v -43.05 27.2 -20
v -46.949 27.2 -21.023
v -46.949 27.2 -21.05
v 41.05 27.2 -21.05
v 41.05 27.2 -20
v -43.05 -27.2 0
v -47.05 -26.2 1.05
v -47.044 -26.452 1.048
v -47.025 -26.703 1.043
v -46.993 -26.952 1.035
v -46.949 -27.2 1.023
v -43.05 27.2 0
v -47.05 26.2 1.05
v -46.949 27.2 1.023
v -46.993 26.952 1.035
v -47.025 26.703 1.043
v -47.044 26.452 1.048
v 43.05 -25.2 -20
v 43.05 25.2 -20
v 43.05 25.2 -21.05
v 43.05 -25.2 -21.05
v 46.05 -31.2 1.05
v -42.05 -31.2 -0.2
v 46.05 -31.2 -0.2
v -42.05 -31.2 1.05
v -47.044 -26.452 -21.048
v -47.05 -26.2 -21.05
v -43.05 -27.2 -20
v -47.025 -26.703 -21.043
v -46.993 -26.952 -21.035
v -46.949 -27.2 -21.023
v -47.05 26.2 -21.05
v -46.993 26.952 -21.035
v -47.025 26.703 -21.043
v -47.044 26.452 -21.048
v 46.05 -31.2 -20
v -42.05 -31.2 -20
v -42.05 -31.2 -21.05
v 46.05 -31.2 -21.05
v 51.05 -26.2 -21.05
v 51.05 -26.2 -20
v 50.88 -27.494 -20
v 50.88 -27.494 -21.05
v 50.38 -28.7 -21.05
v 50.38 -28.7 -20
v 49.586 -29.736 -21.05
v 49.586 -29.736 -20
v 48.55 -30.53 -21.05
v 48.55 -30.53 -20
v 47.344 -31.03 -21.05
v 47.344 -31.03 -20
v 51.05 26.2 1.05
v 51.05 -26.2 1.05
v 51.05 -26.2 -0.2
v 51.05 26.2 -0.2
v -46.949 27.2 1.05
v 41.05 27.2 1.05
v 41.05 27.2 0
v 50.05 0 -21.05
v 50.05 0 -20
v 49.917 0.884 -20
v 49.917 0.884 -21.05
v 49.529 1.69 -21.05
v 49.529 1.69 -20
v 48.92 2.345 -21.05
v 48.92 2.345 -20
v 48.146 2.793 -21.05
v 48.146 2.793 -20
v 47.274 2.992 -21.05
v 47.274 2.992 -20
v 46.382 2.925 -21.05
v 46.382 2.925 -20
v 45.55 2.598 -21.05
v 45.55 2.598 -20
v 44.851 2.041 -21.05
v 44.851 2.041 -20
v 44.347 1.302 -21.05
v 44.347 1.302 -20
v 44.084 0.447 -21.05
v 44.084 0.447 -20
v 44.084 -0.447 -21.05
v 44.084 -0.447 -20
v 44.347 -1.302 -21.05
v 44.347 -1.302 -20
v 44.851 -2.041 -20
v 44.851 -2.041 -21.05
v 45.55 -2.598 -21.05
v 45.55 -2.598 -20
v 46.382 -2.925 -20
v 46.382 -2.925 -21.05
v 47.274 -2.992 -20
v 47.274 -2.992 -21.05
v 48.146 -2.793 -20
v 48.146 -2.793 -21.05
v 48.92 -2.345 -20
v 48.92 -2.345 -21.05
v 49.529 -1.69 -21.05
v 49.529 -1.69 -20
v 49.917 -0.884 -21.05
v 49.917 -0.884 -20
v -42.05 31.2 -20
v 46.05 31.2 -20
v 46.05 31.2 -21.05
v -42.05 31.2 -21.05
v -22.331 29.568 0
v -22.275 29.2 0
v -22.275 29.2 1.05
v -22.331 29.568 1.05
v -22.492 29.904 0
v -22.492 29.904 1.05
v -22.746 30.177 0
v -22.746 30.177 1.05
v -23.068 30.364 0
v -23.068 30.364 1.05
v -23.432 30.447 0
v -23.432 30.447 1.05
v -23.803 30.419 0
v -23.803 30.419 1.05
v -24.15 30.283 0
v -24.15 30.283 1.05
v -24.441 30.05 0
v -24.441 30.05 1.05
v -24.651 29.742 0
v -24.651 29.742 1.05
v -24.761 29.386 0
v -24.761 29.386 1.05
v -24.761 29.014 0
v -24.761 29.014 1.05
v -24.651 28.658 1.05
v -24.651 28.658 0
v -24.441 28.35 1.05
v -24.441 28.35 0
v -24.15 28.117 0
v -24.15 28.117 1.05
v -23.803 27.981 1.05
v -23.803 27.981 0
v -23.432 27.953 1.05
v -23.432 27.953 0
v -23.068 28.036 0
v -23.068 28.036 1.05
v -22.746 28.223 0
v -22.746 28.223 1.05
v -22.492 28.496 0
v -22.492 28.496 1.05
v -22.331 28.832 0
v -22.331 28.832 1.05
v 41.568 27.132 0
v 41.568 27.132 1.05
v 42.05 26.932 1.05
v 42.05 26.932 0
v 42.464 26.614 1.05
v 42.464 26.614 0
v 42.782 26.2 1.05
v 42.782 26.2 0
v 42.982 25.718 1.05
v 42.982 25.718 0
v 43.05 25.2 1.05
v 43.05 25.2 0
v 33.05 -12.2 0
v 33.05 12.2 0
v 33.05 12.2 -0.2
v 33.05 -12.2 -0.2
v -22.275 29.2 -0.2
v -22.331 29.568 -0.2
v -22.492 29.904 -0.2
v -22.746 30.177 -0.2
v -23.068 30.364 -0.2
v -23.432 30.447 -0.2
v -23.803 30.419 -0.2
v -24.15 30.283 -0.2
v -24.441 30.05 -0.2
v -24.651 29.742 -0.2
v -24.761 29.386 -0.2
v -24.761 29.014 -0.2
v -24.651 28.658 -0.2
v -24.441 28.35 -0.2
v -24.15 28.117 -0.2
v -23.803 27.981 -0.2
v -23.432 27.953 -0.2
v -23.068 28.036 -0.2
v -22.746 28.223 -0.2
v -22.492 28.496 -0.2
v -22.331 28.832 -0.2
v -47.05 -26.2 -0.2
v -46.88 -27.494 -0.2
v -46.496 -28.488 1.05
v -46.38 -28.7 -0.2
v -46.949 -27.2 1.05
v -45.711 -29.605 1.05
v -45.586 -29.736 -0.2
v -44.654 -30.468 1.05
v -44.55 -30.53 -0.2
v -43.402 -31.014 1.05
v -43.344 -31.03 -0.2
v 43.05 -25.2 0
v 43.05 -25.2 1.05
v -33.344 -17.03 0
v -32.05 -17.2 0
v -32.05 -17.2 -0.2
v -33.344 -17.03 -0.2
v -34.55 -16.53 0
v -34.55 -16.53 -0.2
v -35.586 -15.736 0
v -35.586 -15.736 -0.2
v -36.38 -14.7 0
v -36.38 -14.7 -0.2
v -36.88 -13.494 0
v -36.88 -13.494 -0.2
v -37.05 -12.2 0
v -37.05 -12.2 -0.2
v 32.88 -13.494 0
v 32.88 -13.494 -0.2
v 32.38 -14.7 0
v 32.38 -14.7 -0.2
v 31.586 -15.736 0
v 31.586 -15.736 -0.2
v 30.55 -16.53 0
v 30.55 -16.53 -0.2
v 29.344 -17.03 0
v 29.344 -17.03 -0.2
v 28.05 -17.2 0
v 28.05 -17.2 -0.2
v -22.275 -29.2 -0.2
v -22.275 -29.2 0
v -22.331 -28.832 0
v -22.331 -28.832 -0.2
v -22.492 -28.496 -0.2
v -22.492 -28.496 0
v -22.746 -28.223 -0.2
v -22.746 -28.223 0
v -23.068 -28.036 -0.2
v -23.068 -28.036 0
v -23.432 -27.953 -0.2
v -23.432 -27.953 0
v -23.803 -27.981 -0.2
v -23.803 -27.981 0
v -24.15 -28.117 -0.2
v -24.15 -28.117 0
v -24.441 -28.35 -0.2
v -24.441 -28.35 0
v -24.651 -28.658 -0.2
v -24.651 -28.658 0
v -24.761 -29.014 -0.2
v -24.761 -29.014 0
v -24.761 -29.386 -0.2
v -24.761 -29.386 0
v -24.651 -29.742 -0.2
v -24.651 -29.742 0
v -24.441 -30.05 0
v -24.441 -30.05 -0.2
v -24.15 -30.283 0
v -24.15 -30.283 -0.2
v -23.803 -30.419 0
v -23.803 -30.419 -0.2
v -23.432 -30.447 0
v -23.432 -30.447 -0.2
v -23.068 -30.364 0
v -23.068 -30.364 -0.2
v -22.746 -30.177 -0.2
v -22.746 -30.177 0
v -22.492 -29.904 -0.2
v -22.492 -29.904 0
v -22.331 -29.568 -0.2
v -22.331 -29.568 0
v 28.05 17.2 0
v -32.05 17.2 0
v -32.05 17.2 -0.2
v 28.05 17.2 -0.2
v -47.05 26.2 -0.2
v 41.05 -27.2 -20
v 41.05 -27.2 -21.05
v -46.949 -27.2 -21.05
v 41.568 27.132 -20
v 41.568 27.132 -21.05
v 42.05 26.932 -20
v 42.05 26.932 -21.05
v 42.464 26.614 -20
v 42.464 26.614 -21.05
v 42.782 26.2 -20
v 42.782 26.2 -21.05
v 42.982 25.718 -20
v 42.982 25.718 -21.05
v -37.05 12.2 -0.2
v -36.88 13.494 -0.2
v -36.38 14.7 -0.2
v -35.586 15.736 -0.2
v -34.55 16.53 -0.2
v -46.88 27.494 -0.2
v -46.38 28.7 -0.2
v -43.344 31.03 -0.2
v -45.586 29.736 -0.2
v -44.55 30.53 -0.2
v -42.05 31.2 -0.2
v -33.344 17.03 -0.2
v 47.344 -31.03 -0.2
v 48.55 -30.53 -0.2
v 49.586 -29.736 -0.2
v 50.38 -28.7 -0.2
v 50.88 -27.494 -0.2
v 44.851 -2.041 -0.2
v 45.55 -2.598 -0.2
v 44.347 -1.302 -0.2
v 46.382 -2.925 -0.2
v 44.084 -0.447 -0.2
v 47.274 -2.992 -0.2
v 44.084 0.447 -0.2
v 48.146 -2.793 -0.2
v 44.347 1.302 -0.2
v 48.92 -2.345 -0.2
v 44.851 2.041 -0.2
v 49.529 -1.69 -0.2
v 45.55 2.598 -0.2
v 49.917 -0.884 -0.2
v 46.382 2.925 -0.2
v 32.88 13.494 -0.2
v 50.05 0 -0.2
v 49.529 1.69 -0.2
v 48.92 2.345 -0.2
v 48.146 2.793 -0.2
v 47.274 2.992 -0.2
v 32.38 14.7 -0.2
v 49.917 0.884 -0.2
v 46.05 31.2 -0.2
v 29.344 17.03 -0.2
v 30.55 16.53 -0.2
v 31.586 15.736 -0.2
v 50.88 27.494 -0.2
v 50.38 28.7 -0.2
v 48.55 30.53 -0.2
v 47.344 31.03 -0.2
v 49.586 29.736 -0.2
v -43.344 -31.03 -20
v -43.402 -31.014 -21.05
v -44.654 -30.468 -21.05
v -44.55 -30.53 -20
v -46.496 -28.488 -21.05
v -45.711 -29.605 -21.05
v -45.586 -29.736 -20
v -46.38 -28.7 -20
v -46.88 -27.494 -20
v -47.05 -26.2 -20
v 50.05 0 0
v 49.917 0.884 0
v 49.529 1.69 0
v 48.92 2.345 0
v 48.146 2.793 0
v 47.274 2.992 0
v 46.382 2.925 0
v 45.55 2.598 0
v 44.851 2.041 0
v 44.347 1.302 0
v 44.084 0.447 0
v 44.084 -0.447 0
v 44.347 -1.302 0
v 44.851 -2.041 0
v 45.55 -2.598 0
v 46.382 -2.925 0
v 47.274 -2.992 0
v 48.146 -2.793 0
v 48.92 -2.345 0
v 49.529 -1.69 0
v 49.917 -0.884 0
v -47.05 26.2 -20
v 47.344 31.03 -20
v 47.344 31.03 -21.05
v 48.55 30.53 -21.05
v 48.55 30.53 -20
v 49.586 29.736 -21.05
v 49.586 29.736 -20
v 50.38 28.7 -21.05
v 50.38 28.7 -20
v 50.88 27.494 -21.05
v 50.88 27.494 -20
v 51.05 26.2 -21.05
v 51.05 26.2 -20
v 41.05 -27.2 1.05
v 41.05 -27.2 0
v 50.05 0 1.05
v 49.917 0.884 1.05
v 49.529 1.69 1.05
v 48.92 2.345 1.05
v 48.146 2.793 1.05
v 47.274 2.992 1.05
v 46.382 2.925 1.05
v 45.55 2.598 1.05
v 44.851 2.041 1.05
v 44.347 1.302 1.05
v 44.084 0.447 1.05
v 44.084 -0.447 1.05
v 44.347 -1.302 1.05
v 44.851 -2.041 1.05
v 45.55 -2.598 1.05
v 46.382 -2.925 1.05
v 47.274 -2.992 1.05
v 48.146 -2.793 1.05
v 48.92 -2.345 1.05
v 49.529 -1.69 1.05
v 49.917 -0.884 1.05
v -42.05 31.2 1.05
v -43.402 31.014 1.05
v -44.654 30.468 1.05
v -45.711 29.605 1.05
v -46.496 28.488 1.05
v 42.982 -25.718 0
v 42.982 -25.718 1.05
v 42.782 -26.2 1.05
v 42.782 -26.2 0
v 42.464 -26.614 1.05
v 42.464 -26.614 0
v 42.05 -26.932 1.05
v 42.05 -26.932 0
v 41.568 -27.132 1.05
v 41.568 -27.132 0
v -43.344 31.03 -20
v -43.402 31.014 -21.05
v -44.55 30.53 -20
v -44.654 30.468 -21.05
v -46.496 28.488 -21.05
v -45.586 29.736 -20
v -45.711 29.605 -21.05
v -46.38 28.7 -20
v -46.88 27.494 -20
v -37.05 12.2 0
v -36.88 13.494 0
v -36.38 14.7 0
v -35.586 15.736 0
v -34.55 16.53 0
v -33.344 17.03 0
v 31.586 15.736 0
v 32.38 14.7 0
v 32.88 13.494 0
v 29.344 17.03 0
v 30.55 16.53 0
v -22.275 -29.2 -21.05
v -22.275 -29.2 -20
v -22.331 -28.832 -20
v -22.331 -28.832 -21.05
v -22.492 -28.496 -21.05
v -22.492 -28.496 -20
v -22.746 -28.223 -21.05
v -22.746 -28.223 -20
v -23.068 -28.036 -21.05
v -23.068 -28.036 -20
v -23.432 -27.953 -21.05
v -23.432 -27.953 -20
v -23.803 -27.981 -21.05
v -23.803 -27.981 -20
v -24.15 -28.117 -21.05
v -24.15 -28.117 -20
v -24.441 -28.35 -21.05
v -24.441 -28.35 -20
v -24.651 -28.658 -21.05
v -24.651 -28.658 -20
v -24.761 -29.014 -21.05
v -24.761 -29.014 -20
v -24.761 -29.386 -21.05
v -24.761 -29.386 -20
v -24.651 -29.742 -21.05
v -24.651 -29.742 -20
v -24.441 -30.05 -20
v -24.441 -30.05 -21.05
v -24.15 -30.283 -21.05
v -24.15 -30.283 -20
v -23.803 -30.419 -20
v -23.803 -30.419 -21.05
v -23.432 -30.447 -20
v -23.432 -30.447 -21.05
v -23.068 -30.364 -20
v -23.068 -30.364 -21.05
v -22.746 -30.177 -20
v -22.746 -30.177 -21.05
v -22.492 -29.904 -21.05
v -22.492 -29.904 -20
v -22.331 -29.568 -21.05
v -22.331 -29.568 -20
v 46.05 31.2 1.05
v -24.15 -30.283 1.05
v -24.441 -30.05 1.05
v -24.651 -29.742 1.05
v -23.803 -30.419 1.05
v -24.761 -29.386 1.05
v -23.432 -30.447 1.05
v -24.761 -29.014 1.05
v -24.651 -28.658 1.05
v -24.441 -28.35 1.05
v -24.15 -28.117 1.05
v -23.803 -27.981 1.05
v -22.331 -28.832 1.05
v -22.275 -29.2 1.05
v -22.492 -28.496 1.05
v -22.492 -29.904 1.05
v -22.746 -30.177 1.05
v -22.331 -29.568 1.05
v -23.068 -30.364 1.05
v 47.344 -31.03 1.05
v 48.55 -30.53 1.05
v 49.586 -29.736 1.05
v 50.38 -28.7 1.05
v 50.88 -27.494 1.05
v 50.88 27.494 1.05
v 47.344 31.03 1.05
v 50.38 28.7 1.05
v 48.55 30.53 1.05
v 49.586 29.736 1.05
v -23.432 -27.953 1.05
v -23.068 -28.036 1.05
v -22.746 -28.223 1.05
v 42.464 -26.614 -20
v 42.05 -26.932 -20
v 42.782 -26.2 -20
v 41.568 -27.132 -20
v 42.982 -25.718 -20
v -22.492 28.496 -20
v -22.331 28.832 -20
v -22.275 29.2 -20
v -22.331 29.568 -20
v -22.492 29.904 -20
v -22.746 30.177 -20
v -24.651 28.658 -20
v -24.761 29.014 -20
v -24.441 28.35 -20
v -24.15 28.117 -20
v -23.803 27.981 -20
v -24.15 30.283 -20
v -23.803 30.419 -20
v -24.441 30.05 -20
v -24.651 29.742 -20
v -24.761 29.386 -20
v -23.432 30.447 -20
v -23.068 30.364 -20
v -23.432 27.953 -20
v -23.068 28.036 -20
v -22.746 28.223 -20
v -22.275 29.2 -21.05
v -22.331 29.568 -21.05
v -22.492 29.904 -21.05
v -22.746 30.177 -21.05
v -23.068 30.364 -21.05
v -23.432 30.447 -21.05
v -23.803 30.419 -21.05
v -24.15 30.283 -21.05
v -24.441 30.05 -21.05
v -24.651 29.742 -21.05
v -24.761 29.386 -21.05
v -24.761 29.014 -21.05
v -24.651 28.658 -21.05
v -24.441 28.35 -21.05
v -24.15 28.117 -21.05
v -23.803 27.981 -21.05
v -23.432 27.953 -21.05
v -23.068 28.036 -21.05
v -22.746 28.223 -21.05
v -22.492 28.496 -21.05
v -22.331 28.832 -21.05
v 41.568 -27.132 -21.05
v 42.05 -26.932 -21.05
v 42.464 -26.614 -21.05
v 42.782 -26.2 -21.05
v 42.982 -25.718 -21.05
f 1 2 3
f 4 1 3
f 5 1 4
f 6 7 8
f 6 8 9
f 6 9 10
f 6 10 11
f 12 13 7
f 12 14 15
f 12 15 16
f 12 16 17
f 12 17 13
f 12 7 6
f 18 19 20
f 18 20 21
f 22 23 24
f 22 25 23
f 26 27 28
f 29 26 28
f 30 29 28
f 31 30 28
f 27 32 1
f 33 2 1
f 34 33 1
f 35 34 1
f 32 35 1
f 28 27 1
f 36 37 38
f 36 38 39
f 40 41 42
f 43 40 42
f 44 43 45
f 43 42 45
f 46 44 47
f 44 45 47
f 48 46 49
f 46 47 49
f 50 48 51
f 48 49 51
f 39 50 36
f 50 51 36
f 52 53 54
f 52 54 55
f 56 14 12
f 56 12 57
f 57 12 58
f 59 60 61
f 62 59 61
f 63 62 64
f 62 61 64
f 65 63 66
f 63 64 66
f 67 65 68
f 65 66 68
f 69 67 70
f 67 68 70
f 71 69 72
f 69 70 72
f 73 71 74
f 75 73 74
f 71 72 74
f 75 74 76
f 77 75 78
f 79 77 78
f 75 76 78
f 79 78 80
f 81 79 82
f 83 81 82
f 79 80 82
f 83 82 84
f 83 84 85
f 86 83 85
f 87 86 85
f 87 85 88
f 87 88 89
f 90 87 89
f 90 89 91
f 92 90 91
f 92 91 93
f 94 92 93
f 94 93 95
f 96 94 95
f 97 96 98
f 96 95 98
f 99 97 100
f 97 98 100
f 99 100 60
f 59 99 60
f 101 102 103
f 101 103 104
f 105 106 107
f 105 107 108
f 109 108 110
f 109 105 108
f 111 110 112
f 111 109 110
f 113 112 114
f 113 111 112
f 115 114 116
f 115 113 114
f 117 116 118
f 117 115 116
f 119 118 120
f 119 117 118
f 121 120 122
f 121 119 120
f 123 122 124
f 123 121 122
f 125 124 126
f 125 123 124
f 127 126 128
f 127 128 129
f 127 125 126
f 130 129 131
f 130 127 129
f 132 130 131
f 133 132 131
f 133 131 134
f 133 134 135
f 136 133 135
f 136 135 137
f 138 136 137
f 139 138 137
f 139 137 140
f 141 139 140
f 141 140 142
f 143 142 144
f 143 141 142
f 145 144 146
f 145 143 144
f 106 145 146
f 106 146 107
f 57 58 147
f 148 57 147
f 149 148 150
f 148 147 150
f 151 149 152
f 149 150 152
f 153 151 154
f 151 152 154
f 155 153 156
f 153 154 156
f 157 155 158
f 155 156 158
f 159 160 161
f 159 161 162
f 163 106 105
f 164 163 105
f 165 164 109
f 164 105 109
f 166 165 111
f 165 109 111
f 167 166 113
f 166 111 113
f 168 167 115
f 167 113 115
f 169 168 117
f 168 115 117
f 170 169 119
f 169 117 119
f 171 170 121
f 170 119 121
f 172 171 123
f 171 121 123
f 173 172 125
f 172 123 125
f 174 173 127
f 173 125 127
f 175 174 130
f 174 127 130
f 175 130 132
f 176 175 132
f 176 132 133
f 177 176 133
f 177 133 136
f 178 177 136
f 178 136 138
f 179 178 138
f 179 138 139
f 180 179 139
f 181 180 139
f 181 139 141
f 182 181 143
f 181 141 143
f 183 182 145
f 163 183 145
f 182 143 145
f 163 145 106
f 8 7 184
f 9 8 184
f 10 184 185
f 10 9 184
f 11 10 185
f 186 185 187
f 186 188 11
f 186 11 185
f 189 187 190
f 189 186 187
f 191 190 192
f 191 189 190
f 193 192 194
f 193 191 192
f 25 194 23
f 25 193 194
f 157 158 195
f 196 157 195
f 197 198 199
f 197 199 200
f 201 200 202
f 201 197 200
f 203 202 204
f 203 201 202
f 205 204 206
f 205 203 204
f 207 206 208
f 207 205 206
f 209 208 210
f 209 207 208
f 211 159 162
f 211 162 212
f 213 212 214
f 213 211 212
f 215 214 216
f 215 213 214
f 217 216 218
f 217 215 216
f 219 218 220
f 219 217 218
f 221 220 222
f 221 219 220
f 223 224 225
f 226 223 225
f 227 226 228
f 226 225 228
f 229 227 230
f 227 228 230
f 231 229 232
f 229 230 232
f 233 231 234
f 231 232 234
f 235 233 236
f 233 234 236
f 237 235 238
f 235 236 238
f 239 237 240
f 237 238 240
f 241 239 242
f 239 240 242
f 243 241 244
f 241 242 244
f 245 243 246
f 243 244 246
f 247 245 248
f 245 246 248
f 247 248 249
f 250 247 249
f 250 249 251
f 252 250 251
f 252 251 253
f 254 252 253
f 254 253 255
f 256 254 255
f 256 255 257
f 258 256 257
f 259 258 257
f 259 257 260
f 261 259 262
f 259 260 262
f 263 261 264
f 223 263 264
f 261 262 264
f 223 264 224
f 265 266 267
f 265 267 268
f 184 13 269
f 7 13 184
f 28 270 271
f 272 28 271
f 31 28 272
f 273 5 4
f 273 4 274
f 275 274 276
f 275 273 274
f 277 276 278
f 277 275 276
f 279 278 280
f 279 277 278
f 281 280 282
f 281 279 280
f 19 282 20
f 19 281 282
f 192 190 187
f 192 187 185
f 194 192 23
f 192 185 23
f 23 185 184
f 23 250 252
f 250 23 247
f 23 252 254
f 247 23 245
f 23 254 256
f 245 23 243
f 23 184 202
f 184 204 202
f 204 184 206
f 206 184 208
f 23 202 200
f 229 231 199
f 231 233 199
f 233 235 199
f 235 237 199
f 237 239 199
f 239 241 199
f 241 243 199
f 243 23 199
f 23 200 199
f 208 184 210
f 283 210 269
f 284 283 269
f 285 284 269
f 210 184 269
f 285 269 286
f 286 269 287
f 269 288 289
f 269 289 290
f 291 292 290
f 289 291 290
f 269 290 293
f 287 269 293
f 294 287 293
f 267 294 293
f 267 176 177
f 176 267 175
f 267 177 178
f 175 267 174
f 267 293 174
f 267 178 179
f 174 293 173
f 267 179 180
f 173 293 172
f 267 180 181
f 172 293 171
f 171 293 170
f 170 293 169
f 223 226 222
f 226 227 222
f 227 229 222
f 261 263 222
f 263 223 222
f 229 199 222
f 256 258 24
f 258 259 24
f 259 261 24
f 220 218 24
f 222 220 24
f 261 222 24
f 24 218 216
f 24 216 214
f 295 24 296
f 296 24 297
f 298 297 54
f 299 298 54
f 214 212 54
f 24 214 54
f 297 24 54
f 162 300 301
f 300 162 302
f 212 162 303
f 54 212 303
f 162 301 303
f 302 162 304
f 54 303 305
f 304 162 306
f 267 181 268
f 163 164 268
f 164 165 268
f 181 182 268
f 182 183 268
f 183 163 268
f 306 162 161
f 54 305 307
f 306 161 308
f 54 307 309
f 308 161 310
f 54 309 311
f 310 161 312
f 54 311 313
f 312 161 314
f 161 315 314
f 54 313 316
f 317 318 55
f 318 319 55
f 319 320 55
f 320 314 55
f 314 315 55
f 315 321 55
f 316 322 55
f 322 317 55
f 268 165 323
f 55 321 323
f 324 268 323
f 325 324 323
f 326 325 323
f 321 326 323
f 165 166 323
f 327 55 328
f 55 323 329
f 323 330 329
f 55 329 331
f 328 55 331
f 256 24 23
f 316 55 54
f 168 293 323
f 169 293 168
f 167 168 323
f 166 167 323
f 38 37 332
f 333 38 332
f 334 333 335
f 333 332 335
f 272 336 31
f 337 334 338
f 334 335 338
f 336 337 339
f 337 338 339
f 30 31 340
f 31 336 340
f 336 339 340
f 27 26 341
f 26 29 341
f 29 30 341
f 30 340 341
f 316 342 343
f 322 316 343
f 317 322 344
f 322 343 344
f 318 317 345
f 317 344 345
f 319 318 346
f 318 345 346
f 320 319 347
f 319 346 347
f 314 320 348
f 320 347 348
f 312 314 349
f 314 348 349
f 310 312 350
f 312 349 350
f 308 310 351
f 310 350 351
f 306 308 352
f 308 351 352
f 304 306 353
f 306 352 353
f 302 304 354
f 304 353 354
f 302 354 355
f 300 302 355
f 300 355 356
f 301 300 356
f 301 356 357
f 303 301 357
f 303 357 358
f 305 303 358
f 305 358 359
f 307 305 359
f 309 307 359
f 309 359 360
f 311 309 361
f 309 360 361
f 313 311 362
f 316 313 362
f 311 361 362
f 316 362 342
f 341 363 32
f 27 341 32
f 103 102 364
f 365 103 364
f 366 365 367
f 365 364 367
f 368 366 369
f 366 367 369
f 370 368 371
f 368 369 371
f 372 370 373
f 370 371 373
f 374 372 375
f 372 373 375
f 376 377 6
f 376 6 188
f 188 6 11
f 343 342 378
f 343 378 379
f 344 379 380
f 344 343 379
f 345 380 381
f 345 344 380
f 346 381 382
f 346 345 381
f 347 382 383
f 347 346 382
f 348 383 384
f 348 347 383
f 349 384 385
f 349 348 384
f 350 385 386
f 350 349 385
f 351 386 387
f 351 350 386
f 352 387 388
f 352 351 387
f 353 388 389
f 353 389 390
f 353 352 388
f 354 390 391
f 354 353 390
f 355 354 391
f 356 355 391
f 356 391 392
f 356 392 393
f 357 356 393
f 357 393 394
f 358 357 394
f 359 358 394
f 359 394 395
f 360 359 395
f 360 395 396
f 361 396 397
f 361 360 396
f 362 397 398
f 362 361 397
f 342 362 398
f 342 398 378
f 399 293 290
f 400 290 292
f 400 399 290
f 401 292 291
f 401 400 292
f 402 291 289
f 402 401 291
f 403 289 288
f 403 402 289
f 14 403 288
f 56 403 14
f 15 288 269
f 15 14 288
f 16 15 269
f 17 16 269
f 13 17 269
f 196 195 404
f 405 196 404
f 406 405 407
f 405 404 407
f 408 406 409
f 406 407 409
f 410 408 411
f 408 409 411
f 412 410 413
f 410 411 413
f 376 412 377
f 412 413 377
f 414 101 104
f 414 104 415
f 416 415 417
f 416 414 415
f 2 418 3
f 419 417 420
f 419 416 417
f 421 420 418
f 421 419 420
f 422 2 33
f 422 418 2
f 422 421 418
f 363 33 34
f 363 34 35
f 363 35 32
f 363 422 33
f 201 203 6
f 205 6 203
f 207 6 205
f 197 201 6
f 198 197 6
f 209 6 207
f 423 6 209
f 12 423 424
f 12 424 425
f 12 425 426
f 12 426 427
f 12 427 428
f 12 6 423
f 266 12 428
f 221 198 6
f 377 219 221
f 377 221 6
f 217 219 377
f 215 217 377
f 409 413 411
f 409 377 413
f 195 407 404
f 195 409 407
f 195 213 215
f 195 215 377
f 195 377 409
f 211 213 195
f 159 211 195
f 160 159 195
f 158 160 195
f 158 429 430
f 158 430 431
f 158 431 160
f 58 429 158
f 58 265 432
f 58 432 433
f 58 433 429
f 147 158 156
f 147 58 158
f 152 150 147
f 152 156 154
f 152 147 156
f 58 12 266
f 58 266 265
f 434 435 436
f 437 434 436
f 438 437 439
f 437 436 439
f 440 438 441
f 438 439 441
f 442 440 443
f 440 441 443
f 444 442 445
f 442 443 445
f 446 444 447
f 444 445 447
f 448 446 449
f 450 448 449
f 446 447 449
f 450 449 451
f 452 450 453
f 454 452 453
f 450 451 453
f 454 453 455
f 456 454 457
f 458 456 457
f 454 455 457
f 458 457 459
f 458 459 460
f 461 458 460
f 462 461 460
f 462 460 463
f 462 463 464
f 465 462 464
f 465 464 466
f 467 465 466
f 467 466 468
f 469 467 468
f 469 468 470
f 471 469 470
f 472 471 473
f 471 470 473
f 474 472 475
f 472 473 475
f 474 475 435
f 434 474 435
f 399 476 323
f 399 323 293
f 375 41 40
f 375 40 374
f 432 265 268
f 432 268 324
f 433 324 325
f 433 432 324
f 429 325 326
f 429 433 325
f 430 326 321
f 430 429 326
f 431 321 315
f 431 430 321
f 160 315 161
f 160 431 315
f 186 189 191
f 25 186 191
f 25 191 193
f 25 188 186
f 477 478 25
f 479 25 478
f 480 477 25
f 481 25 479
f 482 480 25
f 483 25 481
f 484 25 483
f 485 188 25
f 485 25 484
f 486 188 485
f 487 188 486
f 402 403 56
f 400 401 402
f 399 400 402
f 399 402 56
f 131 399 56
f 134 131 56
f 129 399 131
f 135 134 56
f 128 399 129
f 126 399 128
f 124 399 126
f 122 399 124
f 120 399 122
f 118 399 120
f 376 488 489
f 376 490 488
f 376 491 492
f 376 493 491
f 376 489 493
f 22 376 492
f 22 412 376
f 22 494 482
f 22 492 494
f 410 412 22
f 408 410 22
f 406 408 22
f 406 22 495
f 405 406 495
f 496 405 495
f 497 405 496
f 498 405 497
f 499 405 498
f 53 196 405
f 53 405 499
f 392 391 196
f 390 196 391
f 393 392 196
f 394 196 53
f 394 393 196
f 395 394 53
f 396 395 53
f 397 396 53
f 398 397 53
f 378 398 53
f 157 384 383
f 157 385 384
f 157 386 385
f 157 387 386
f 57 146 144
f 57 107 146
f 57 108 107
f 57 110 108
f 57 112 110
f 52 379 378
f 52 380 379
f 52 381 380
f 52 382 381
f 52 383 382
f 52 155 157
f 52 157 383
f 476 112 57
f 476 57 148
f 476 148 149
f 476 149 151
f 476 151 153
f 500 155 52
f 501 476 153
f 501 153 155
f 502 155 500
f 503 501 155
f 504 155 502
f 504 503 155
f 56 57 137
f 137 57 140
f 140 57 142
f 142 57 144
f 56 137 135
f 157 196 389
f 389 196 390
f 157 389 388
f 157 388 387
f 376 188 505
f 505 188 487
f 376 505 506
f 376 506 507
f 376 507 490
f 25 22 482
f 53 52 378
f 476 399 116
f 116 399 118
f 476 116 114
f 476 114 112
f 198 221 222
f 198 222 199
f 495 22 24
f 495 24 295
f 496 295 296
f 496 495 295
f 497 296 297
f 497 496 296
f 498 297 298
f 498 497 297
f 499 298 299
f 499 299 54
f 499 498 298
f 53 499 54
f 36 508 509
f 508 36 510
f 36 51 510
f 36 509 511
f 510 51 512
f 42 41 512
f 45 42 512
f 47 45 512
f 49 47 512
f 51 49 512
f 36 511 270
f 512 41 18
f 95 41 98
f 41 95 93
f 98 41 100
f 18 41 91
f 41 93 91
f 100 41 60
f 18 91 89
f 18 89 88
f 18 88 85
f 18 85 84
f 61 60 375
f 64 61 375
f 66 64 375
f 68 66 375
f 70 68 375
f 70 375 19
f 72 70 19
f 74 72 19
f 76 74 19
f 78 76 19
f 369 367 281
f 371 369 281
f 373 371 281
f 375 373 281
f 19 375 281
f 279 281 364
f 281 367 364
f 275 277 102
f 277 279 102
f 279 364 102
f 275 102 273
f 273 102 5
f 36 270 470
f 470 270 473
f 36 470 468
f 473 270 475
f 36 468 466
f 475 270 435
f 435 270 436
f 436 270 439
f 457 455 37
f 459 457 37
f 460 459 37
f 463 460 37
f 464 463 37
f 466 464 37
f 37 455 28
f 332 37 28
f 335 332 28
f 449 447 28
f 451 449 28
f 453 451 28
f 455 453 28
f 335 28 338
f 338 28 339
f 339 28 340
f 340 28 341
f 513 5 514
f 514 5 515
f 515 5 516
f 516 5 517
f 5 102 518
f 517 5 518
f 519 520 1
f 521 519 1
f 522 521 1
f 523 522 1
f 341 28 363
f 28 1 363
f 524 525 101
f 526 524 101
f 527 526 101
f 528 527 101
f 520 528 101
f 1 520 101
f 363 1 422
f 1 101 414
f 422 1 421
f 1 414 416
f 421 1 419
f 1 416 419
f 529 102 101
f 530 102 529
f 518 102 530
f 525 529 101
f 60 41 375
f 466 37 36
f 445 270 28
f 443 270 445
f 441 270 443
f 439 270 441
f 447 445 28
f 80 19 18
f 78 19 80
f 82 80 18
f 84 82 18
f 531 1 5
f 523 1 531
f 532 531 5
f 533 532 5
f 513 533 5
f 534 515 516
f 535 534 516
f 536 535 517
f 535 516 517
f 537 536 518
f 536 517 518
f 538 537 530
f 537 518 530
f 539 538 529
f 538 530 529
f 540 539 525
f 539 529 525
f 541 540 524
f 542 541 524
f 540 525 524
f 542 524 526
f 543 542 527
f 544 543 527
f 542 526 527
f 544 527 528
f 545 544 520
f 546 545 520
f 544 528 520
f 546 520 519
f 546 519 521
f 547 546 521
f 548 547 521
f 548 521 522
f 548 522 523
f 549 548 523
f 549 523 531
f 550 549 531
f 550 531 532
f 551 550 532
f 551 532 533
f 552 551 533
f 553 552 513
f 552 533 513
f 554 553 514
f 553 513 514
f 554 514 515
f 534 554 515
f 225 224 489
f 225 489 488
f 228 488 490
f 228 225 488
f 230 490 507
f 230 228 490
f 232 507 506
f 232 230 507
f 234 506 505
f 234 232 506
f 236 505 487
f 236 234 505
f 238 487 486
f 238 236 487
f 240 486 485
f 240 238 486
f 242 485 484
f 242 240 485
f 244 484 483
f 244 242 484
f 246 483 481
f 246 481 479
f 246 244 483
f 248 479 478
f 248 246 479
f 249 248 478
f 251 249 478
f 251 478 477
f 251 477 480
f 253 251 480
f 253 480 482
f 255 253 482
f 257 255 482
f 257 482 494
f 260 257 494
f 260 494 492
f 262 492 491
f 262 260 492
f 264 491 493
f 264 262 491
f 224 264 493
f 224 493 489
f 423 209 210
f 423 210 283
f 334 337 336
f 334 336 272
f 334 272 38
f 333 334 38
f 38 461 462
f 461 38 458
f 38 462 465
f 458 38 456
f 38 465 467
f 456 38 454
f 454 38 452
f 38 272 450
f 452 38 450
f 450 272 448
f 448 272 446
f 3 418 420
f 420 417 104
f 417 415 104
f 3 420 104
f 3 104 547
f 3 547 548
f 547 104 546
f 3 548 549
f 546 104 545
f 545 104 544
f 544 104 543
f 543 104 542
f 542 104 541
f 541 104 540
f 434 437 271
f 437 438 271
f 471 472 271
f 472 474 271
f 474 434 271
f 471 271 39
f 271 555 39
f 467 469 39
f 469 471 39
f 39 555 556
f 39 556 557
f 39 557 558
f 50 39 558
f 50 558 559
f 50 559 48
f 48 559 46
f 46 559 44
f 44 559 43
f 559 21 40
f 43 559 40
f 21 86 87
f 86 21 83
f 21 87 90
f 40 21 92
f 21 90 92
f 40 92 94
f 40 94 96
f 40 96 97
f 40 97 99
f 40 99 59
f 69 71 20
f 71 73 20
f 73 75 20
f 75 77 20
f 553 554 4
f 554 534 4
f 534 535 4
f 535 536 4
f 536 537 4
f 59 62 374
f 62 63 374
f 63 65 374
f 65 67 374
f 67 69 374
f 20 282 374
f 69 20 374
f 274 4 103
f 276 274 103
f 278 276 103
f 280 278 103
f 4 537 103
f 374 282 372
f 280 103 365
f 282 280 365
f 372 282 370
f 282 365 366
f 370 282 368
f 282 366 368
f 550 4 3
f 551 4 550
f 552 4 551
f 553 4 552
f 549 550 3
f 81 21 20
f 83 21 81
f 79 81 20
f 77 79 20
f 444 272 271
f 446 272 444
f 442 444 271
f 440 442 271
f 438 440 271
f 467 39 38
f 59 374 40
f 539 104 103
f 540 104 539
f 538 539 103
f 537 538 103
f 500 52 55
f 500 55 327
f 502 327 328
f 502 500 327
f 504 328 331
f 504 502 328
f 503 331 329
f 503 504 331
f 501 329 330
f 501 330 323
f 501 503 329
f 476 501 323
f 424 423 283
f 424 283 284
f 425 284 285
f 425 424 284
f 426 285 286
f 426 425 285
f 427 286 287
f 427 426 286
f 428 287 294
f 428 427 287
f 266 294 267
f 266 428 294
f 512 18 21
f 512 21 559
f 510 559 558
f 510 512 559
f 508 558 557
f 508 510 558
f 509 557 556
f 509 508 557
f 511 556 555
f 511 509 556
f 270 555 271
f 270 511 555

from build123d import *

# Parameters (mm, degrees)
F1_R        = 1.25
F1_R_2      = 3
F2_DEPTH    = 1.05
F5_T1_DEPTH = 26.05
F8_R        = 1.25
F8_R_2      = 3
F9_DEPTH    = 0.2


# Not quite as in the source:
# - a fillet or chamfer that OpenCascade refuses, or shapes differently, is made with other operations: its cross-section is extruded or revolved along the edge and cut away or added


with BuildPart() as f2:
    # F1 (on Top) → F2 (new body)
    with BuildSketch(Plane.XY):
        with BuildLine():
            Line((-47.05, 27.2), (-43.05, 27.2))
            Line((-43.05, 27.2), (41.05, 27.2))
            ThreePointArc((41.05, 27.2), (42.4642135624, 26.6142135624), (43.05, 25.2))
            Line((43.05, 25.2), (43.05, -25.2))
            ThreePointArc((43.05, -25.2), (42.4642135624, -26.6142135624), (41.05, -27.2))
            Line((41.05, -27.2), (-43.05, -27.2))
            Line((-43.05, -27.2), (-47.05, -27.2))
            Line((-47.05, -27.2), (-47.05, -31.2))
            Line((-47.05, -31.2), (51.05, -31.2))
            Line((51.05, -31.2), (51.05, 31.2))
            Line((51.05, 31.2), (-47.05, 31.2))
            Line((-47.05, 31.2), (-47.05, 27.2))
        make_face()
        with Locations((-23.525, -29.2)):
            Circle(F1_R, mode=Mode.SUBTRACT)
        with Locations((-23.525, 29.2)):
            Circle(F1_R, mode=Mode.SUBTRACT)
        with Locations((47.05, 0)):
            Circle(F1_R_2, mode=Mode.SUBTRACT)
    extrude(amount=F2_DEPTH)

    # F4: sweep along a path in F1
    with BuildLine(Plane.XY) as f4_path:
        Line((-47.05, -27.2), (-47.05, 27.2))
    # F3 (on face) → F4 (sweep)
    with BuildSketch(Plane(origin=(0, -27.2, 0), x_dir=(-1, 0, 0), z_dir=(0, 1, 0))):
        Polygon((47.05, 1.05), (43.05, 0), (47.05, 0), align=None)
    sweep(path=f4_path.line)

    # F5: fillet of radius 5 on 4 edges, made by hand

    # F5_s2 → F5_t1 (cut)
    with BuildSketch(Plane.XY.offset(-12.5)):
        with BuildLine():
            ThreePointArc((-42.05, 31.2), (-45.5855339059, 29.7355339059), (-47.05, 26.2))
            Line((-47.05, 26.2), (-47.05, 31.2))
            Line((-47.05, 31.2), (-42.05, 31.2))
        make_face()
        with BuildLine():
            ThreePointArc((-42.05, -31.2), (-45.5855339059, -29.7355339059), (-47.05, -26.2))
            Line((-47.05, -26.2), (-47.05, -31.2))
            Line((-47.05, -31.2), (-42.05, -31.2))
        make_face()
        with BuildLine():
            ThreePointArc((46.05, 31.2), (49.5855339059, 29.7355339059), (51.05, 26.2))
            Line((51.05, 26.2), (51.05, 31.2))
            Line((51.05, 31.2), (46.05, 31.2))
        make_face()
        with BuildLine():
            ThreePointArc((51.05, -26.2), (49.5855339059, -29.7355339059), (46.05, -31.2))
            Line((46.05, -31.2), (51.05, -31.2))
            Line((51.05, -31.2), (51.05, -26.2))
        make_face()
    extrude(amount=F5_T1_DEPTH, mode=Mode.SUBTRACT)


with BuildPart() as f7_1:
    # F7: instance of F2
    add(f2.part.mirror(Plane.XY.offset(-10)))


with BuildPart() as f2_1:
    add(f2.part)

    # F8 (on face) → F9 (join)
    with BuildSketch(Plane.XY):
        with BuildLine():
            Line((-42.05, -31.2), (46.05, -31.2))
            ThreePointArc((46.05, -31.2), (49.5855339059, -29.7355339059), (51.05, -26.2))
            Line((51.05, -26.2), (51.05, 26.2))
            ThreePointArc((51.05, 26.2), (49.5855339059, 29.7355339059), (46.05, 31.2))
            Line((46.05, 31.2), (-42.05, 31.2))
            ThreePointArc((-42.05, 31.2), (-45.5855339059, 29.7355339059), (-47.05, 26.2))
            Line((-47.05, 26.2), (-47.05, -26.2))
            ThreePointArc((-47.05, -26.2), (-45.5855339059, -29.7355339059), (-42.05, -31.2))
        make_face()
        with Locations((-23.525, -29.2)):
            Circle(F8_R, mode=Mode.SUBTRACT)
        with BuildLine():
            ThreePointArc((33.05, -12.2), (31.5855339059, -15.7355339059), (28.05, -17.2))
            Line((28.05, -17.2), (-32.05, -17.2))
            ThreePointArc((-32.05, -17.2), (-35.5855339059, -15.7355339059), (-37.05, -12.2))
            Line((-37.05, -12.2), (-37.05, 12.2))
            ThreePointArc((-37.05, 12.2), (-35.5855339059, 15.7355339059), (-32.05, 17.2))
            Line((-32.05, 17.2), (28.05, 17.2))
            ThreePointArc((28.05, 17.2), (31.5855339059, 15.7355339059), (33.05, 12.2))
            Line((33.05, 12.2), (33.05, -12.2))
        make_face(mode=Mode.SUBTRACT)
        with Locations((-23.525, 29.2)):
            Circle(F8_R, mode=Mode.SUBTRACT)
        with Locations((47.05, 0)):
            Circle(F8_R_2, mode=Mode.SUBTRACT)
    extrude(amount=-F9_DEPTH)


solid = Compound([f7_1.part, f2_1.part])
